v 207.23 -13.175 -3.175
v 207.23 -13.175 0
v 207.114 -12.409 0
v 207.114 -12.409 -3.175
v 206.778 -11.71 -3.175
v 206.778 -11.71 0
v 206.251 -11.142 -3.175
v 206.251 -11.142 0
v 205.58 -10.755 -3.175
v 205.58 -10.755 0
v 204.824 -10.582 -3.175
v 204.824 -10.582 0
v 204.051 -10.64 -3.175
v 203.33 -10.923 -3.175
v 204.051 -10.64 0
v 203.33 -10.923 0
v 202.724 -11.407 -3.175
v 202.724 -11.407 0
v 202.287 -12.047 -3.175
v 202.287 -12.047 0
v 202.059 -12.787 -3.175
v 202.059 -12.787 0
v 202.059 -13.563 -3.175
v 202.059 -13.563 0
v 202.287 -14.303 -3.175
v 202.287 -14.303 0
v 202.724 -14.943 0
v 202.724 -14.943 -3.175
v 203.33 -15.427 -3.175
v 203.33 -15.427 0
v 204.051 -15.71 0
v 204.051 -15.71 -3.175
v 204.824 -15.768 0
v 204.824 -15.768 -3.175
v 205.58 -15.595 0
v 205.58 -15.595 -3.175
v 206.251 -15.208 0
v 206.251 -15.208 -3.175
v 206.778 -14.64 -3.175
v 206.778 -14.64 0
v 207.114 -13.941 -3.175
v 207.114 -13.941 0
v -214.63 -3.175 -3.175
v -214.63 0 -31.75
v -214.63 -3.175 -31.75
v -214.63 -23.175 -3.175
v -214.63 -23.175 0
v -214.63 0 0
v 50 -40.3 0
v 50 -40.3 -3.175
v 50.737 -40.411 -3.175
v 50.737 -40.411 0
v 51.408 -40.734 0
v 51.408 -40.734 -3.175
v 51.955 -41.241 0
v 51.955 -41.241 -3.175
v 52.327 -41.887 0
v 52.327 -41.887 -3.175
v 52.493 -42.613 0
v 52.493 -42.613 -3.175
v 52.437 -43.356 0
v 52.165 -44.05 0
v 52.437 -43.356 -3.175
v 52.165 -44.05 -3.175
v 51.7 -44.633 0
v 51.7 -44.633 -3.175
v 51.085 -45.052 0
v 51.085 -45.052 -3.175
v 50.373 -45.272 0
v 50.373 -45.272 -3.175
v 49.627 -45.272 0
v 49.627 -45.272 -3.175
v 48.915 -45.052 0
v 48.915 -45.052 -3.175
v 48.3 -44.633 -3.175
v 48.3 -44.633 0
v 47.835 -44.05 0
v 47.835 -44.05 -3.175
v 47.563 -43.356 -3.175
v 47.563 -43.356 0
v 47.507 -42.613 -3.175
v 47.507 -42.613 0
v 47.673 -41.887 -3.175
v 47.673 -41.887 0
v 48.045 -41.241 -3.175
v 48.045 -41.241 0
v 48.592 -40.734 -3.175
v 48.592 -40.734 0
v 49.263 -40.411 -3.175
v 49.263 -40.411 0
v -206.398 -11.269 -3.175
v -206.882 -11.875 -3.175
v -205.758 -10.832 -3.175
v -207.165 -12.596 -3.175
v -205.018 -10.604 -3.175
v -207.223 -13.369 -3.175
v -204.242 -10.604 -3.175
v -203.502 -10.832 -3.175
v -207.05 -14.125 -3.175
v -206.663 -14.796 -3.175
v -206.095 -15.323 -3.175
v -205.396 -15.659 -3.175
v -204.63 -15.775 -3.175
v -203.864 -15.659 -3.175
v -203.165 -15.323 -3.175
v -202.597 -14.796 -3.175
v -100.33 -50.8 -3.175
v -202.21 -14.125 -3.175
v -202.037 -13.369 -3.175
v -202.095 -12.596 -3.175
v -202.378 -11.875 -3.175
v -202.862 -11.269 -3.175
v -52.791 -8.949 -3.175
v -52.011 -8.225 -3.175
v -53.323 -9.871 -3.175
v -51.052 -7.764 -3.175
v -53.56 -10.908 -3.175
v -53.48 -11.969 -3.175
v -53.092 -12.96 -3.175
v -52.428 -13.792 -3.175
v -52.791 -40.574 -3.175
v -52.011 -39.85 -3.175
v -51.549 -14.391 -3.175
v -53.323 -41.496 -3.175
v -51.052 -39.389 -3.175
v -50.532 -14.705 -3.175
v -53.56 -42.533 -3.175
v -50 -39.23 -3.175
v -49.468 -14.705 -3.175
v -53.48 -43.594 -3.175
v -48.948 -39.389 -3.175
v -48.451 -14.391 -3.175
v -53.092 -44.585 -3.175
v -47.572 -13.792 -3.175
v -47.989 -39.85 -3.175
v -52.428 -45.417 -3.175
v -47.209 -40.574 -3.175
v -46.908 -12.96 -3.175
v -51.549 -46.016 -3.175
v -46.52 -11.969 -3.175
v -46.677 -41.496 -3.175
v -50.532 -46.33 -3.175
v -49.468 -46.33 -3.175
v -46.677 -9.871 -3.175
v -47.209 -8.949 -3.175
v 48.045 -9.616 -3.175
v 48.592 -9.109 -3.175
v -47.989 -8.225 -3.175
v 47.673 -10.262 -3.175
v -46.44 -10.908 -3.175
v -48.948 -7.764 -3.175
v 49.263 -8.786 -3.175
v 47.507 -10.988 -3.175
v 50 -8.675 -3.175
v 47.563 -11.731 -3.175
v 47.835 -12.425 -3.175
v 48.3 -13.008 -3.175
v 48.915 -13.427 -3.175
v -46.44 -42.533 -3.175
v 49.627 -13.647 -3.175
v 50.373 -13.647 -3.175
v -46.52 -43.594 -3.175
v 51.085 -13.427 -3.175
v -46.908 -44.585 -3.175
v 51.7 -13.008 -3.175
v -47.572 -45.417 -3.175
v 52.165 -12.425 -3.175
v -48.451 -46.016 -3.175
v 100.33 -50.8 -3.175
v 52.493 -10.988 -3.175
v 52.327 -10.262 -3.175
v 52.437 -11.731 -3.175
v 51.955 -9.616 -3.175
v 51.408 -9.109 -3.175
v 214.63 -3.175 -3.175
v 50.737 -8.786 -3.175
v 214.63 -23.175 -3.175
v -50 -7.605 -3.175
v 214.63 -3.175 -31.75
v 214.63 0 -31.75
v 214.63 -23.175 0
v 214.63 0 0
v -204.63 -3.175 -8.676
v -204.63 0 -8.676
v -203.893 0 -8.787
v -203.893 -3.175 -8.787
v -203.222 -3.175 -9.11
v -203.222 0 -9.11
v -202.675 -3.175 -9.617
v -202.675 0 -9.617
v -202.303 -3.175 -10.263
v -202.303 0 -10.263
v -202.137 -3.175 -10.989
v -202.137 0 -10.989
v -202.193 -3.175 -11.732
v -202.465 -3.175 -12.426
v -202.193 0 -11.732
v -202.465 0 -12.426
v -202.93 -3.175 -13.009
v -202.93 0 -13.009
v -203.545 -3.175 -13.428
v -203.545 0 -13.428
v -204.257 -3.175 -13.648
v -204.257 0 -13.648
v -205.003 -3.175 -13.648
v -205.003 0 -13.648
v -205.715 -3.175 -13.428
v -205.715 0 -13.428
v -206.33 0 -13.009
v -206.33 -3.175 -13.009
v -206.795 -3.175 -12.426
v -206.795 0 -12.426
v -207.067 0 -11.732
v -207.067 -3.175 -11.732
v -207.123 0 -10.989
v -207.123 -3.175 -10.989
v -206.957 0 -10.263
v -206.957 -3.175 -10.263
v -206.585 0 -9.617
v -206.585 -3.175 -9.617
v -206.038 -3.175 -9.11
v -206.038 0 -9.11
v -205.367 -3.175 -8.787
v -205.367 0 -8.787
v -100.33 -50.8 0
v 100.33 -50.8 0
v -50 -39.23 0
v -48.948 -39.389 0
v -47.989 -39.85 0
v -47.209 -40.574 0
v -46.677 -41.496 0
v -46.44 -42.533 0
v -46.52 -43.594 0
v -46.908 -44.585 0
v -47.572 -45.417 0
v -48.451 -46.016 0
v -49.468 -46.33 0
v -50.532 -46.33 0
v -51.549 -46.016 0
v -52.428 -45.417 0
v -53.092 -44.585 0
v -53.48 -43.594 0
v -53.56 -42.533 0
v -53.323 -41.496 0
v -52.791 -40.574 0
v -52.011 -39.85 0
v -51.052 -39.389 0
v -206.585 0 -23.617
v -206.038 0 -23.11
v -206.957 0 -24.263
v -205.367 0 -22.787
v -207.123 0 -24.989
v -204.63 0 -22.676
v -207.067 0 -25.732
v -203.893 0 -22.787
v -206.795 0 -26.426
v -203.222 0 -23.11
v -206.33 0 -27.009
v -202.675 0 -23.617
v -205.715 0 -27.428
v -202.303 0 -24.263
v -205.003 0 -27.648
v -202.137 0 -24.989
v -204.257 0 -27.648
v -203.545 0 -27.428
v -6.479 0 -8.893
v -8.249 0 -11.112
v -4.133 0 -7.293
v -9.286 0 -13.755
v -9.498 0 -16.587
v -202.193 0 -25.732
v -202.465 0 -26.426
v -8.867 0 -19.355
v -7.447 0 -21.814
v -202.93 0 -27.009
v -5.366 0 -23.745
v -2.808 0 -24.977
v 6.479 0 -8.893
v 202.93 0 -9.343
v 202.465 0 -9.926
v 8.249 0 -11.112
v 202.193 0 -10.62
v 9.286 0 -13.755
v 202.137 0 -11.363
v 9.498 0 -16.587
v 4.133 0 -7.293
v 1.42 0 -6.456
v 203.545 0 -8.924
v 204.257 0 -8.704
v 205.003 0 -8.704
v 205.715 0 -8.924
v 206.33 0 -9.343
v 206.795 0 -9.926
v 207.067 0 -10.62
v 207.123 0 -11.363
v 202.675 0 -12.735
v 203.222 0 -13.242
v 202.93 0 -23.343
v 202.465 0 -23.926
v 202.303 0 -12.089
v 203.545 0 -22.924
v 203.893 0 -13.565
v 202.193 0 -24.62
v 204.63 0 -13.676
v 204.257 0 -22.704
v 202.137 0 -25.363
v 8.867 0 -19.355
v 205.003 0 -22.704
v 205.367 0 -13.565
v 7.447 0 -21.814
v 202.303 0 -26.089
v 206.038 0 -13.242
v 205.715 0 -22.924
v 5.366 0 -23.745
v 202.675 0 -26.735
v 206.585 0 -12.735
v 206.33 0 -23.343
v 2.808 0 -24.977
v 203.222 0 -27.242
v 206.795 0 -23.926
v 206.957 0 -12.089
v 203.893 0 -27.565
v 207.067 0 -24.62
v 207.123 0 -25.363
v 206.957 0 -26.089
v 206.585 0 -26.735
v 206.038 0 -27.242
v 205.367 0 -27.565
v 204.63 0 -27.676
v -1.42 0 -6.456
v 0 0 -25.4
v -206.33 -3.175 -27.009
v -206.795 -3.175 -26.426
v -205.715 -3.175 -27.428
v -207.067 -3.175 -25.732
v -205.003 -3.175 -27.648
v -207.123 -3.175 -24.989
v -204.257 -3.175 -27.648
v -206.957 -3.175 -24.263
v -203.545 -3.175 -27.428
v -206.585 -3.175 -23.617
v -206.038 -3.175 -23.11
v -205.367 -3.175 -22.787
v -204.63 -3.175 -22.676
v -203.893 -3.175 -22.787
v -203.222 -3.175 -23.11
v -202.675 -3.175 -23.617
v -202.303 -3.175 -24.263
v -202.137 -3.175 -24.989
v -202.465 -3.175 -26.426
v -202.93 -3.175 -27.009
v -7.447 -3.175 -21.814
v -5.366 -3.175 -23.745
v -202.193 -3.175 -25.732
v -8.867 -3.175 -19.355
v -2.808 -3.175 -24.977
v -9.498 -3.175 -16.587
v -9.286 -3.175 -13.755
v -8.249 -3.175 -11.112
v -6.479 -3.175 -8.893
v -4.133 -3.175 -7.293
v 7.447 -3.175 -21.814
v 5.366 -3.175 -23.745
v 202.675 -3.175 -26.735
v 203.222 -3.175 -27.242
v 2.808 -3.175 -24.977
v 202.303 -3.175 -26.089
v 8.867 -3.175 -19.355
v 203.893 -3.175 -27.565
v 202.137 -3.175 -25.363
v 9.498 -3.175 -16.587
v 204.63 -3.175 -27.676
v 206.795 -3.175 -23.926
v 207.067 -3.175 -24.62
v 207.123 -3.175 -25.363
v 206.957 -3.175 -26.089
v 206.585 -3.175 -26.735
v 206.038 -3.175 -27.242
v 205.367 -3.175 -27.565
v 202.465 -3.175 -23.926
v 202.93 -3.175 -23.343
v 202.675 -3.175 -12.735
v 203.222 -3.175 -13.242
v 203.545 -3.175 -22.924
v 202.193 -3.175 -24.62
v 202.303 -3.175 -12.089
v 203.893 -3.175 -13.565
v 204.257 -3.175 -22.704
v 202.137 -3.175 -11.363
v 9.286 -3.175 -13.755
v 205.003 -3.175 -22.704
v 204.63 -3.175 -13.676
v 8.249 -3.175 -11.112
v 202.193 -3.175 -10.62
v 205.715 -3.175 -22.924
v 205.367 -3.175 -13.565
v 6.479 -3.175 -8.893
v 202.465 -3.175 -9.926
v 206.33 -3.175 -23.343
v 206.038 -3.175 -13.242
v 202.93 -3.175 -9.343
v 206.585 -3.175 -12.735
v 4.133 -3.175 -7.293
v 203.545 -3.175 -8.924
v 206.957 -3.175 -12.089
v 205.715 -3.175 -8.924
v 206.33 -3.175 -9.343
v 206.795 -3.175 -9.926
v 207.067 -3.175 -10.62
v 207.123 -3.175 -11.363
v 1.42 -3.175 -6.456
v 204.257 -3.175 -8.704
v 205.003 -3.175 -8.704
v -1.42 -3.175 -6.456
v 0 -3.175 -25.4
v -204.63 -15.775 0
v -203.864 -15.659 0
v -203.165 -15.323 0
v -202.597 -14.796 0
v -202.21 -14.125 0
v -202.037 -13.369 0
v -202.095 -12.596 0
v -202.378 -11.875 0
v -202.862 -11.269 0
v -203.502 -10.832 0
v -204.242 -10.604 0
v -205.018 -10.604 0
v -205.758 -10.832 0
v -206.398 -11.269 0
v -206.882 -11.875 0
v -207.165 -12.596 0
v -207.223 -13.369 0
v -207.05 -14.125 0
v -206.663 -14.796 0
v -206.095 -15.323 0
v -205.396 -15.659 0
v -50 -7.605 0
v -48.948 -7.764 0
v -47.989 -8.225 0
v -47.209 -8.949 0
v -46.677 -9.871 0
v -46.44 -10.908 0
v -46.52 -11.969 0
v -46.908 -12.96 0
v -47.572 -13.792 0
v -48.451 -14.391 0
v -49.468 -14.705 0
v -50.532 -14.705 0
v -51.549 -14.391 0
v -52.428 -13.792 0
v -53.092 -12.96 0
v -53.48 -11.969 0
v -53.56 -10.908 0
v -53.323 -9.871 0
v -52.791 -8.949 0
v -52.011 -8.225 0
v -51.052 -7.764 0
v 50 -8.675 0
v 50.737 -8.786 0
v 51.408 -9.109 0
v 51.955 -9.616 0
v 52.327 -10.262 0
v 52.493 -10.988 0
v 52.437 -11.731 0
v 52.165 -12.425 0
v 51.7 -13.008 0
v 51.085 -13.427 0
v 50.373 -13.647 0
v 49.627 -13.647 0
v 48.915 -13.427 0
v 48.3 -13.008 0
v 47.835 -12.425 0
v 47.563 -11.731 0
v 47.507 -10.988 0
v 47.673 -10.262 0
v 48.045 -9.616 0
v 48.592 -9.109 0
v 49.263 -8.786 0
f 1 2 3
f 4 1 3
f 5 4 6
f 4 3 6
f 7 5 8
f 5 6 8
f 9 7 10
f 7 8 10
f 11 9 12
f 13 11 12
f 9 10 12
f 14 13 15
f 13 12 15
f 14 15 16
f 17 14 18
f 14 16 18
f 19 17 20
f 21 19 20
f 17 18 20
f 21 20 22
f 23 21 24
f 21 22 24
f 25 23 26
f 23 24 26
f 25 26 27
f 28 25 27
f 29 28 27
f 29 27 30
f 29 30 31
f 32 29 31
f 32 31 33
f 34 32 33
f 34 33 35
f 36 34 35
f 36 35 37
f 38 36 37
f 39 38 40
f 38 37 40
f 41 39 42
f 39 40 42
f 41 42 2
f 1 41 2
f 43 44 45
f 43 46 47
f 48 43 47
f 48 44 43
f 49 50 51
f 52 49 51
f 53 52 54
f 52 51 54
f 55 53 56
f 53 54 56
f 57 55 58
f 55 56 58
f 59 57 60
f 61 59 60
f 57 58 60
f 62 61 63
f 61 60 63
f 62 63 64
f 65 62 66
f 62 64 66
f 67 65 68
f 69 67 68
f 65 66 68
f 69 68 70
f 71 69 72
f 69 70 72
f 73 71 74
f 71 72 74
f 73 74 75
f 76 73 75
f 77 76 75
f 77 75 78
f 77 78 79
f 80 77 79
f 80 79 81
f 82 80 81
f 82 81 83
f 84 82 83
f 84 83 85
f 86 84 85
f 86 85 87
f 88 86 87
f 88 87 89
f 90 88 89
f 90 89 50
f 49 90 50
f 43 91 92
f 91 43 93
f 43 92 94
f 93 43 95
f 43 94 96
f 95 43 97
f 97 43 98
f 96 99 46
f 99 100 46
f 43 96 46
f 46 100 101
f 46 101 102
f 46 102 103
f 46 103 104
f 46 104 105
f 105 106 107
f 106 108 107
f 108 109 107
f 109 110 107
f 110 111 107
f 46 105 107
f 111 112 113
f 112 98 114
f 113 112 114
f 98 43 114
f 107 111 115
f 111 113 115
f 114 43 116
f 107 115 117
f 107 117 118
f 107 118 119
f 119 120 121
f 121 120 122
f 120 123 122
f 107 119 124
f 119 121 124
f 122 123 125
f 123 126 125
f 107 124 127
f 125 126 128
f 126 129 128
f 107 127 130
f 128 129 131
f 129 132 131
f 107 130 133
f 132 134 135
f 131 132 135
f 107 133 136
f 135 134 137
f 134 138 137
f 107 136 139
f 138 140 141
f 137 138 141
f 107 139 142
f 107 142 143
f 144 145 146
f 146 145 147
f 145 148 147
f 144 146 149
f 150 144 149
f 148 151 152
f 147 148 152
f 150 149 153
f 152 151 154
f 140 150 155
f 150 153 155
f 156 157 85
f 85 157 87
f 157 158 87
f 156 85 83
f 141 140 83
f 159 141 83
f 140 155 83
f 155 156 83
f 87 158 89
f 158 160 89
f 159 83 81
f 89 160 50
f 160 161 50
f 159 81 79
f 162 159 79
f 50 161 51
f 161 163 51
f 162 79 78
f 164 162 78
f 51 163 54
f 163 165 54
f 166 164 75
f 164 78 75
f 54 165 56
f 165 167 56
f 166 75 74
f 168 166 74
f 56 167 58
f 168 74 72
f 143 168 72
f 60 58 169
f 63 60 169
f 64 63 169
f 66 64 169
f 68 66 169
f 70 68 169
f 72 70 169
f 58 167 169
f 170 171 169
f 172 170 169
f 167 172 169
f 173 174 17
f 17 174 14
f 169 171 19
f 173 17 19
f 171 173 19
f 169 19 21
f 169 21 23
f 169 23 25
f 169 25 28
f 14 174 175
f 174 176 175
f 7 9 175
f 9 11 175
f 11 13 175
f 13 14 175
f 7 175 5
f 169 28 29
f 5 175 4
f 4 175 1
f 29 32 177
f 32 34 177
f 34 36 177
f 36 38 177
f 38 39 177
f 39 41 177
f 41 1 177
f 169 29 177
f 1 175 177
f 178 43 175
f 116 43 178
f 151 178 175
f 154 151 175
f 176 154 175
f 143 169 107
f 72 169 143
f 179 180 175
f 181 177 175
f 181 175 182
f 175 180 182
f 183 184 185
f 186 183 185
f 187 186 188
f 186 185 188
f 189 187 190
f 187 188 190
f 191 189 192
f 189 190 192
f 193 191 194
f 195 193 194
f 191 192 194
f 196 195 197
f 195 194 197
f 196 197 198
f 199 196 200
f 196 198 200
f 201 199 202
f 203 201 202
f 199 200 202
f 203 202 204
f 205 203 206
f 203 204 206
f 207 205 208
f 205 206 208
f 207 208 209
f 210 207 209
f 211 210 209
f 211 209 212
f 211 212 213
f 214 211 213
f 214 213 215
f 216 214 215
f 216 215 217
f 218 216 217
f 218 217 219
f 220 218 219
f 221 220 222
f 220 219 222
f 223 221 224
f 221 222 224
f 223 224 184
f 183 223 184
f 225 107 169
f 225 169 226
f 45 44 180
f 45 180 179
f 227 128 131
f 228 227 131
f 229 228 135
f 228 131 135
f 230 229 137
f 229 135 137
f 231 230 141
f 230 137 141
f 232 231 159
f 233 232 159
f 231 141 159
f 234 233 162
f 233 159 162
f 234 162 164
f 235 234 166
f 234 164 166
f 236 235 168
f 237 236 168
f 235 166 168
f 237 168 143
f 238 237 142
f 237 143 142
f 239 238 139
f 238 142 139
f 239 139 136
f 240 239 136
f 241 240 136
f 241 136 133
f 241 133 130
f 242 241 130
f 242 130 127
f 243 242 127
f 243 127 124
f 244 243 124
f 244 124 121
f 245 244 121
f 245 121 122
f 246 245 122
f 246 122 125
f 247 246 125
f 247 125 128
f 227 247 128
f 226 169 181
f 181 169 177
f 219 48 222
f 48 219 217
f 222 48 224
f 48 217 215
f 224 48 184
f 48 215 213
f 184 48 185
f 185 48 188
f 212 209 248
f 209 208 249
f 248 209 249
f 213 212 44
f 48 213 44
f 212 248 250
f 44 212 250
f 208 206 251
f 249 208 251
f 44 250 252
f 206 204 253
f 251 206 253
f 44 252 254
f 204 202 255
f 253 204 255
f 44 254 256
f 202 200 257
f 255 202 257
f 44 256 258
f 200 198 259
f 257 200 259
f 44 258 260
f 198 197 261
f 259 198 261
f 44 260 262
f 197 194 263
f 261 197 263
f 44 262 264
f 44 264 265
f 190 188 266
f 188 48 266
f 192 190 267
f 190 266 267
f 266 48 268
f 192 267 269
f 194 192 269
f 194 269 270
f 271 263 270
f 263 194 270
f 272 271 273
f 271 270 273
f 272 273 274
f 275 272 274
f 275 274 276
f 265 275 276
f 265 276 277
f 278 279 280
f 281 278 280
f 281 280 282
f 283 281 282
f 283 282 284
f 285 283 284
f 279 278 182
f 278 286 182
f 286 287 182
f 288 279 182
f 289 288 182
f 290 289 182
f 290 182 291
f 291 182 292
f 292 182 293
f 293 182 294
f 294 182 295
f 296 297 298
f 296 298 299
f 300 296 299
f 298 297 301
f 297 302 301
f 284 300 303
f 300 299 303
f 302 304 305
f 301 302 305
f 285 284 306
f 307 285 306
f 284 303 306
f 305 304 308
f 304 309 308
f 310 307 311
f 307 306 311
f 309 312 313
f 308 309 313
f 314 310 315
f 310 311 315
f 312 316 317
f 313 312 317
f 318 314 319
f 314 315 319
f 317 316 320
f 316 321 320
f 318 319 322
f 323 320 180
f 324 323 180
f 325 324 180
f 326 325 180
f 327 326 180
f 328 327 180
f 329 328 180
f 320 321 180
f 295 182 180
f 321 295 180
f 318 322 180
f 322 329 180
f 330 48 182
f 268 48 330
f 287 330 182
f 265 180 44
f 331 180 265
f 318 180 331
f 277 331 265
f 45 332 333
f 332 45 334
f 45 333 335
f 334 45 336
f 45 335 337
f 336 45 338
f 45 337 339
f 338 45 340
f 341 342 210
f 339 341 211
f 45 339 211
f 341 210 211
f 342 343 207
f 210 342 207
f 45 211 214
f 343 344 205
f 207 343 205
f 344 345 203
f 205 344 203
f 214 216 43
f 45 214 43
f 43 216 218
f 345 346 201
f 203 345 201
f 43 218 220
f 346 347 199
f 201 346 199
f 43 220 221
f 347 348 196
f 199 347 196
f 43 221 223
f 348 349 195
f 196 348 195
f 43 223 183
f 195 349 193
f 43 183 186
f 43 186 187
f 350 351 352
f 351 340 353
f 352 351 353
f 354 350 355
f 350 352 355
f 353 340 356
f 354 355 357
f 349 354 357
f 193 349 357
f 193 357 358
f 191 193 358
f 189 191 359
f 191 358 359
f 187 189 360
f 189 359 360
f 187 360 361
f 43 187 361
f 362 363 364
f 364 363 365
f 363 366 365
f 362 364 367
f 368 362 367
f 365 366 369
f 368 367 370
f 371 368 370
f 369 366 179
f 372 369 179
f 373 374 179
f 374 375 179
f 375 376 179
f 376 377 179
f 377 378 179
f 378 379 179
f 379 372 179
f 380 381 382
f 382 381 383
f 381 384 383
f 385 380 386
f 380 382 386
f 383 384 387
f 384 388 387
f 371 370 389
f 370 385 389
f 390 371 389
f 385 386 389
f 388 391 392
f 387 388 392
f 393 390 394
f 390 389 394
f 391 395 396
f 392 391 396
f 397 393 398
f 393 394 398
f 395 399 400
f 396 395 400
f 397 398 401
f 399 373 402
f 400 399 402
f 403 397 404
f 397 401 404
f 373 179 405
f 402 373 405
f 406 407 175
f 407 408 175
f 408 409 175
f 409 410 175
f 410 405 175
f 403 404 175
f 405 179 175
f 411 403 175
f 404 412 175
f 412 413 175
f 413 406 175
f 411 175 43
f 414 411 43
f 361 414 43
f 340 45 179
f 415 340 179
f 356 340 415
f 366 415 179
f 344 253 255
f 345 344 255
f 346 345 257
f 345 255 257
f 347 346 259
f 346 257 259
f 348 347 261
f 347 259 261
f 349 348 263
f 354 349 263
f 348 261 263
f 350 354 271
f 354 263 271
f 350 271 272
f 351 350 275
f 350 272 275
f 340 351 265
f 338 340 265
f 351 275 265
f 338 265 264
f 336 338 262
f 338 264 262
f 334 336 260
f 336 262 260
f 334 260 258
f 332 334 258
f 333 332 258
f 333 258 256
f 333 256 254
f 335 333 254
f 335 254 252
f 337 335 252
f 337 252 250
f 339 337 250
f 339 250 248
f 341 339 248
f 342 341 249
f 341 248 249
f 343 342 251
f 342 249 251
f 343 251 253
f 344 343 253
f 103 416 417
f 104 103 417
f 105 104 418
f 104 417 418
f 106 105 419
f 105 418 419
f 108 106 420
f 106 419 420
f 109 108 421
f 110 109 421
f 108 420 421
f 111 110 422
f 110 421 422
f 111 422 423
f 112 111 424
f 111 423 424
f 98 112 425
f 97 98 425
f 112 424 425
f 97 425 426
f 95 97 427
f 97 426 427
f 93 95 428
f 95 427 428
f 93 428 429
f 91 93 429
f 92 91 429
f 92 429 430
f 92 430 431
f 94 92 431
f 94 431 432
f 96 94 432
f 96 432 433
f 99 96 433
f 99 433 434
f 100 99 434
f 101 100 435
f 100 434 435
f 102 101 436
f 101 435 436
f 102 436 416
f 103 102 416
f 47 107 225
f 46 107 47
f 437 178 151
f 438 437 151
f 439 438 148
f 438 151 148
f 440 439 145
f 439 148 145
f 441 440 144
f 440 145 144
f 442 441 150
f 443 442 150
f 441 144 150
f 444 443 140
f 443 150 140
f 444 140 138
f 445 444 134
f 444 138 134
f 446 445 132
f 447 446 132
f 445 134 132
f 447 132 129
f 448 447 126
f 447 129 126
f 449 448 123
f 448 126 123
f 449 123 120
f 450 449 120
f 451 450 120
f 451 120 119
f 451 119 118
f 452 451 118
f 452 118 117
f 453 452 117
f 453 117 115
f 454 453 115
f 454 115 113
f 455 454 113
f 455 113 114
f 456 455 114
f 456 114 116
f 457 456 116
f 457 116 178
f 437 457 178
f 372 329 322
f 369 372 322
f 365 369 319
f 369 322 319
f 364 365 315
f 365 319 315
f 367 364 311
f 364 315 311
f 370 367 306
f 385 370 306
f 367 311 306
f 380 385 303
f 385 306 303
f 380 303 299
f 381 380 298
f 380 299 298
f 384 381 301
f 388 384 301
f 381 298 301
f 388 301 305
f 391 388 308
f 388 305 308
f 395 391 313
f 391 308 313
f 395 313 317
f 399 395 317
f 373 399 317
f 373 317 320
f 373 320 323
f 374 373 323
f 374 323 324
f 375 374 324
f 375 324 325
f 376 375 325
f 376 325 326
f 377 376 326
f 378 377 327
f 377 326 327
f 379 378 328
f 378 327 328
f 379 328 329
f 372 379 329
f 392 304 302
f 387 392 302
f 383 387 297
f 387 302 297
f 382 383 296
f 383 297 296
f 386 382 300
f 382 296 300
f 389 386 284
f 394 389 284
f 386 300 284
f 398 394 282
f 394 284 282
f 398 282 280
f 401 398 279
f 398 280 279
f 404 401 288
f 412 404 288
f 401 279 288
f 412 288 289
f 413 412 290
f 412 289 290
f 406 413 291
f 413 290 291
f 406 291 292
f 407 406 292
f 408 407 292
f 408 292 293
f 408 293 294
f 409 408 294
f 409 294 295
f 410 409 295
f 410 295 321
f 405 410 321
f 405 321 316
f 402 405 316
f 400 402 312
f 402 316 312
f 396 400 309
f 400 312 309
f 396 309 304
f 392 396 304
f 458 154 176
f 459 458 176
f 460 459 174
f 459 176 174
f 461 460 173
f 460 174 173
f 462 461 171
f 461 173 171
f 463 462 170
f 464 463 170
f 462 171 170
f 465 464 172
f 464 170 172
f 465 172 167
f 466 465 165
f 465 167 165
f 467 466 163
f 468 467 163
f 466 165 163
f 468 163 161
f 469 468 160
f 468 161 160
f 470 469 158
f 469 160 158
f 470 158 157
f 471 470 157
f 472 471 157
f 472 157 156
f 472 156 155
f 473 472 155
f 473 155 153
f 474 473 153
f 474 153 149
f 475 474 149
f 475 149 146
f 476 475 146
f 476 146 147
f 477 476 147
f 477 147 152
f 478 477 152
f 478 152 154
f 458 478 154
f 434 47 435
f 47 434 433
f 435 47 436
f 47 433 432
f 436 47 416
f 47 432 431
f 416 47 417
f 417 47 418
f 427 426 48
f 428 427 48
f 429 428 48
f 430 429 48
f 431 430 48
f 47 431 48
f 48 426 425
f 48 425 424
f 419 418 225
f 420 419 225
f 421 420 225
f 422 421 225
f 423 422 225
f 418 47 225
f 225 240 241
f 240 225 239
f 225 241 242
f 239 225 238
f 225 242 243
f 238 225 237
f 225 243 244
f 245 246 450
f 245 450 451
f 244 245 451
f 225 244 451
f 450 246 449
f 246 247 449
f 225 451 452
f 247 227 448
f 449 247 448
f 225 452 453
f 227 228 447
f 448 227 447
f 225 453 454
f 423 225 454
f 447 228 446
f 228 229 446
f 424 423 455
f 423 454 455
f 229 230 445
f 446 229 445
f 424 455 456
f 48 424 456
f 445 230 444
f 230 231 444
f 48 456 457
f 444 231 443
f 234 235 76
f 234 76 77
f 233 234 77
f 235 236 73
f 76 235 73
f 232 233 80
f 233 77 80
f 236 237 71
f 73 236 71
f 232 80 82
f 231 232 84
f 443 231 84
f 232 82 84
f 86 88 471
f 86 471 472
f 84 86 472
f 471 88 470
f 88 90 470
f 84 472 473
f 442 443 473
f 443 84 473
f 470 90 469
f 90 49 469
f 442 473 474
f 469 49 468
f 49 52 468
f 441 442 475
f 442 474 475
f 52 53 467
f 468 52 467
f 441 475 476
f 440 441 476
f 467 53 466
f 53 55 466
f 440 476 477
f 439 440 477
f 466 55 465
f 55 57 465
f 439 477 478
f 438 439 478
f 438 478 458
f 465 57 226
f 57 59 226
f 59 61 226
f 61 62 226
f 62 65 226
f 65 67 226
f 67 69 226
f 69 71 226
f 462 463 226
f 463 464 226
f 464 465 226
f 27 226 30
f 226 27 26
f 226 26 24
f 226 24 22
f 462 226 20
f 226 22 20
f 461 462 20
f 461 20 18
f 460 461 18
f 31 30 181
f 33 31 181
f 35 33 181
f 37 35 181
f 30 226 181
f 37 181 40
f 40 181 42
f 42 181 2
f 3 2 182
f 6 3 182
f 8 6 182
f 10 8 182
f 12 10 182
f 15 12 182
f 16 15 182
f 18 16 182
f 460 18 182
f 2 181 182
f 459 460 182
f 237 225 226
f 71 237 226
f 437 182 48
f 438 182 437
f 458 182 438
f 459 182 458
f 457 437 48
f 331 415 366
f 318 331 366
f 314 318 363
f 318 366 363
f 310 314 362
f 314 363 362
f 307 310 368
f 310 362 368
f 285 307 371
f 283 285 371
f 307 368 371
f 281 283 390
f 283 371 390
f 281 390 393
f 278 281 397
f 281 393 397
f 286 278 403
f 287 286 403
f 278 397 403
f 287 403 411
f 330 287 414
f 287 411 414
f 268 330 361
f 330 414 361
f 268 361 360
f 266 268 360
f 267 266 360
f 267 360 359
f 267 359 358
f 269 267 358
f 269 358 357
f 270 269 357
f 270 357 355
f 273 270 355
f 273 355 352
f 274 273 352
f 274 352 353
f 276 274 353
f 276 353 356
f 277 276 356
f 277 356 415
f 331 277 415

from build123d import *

# Parameters (mm, degrees)
BOSS_EXTRUDE1_DEPTH = 214.63
SKETCH2_R           = 2.5
SKETCH2_R_2         = 3.57
CUT_EXTRUDE1_DEPTH  = 223.403254304
CUT_EXTRUDE2_DEPTH  = 3.175
SKETCH4_R           = 2.5
CUT_EXTRUDE3_DEPTH  = 3.175
CUT_EXTRUDE4_REACH  = 224.131
SKETCH5_R           = 9.525
SKETCH6_R           = 2.6
CUT_EXTRUDE5_DEPTH  = 3.175


with BuildPart() as part:
    # Sketch1 → Boss-Extrude1 (new, symmetric)
    with BuildSketch(Plane(origin=(0, 0, 0), x_dir=(0, 0, -1), z_dir=(1, 0, 0))):
        Polygon((0, 0), (31.75, 0), (31.75, -3.175), (3.175, -3.175), (3.175, -50.8), (0, -50.8), align=None)
    extrude(amount=BOSS_EXTRUDE1_DEPTH, both=True)

    # Sketch2 → Cut-Extrude1 (cut, through all)
    with BuildSketch(Plane(origin=(0, 0, -3.175), x_dir=(-1, 0, 0), z_dir=(0, 0, -1))):
        with Locations(Location((-50, -11.175, 0), (0, 0, 90))):
            Circle(SKETCH2_R)
        with Locations(Location((50, -11.175, 0), (0, 0, 90))):
            Circle(SKETCH2_R_2)
        with Locations(Location((50, -42.8, 0), (0, 0, 90))):
            Circle(SKETCH2_R_2)
        with Locations(Location((-50, -42.8, 0), (0, 0, 90))):
            Circle(SKETCH2_R)
    extrude(amount=-CUT_EXTRUDE1_DEPTH, mode=Mode.SUBTRACT)

    # Sketch3 → Cut-Extrude2 (cut)
    with BuildSketch(Plane(origin=(0, 0, -3.175), x_dir=(-1, 0, 0), z_dir=(0, 0, -1))):
        Polygon((214.63, -50.8), (100.33, -50.8), (214.63, -23.175), align=None)
        Polygon((-214.63, -23.175), (-214.63, -50.8), (-100.33, -50.8), align=None)
    extrude(amount=-CUT_EXTRUDE2_DEPTH, mode=Mode.SUBTRACT)

    # Sketch4 → Cut-Extrude3 (cut)
    with BuildSketch(Plane(origin=(0, 0, 0), x_dir=(1, 0, 0), z_dir=(0, 1, 0))):
        with Locations(Location((-204.63, 11.176, 0), (0, 0, 270))):
            Circle(SKETCH4_R)
        with Locations(Location((-204.63, 25.176, 0), (0, 0, 270))):
            Circle(SKETCH4_R)
        with Locations(Location((204.63, 25.176, 0), (0, 0, 90))):
            Circle(SKETCH4_R)
        with Locations(Location((204.63, 11.176, 0), (0, 0, 90))):
            Circle(SKETCH4_R)
    extrude(amount=-CUT_EXTRUDE3_DEPTH, mode=Mode.SUBTRACT)

    # Sketch5 → Cut-Extrude4 (cut, up to next)
    with BuildSketch(Plane.XZ.offset(3.175), mode=Mode.PRIVATE) as cut_extrude4_sk1:
        with Locations(Location((0, -15.875, 0), (0, 0, 270))):
            Circle(SKETCH5_R)
    cut_extrude4_tool1 = extrude(cut_extrude4_sk1.sketch, amount=-CUT_EXTRUDE4_REACH, mode=Mode.PRIVATE) & part.part
    add(cut_extrude4_tool1.solids().sort_by_distance((0, -3.175, -15.875))[0], mode=Mode.SUBTRACT)

    # Sketch6 → Cut-Extrude5 (cut)
    with BuildSketch(Plane.XY):
        with Locations((204.63, -13.175000066)):
            Circle(SKETCH6_R)
        with Locations(Location((-204.63, -13.175000066, 0), (0, 0, 270))):
            Circle(SKETCH6_R)
    extrude(amount=-CUT_EXTRUDE5_DEPTH, mode=Mode.SUBTRACT)


solid = part.part
